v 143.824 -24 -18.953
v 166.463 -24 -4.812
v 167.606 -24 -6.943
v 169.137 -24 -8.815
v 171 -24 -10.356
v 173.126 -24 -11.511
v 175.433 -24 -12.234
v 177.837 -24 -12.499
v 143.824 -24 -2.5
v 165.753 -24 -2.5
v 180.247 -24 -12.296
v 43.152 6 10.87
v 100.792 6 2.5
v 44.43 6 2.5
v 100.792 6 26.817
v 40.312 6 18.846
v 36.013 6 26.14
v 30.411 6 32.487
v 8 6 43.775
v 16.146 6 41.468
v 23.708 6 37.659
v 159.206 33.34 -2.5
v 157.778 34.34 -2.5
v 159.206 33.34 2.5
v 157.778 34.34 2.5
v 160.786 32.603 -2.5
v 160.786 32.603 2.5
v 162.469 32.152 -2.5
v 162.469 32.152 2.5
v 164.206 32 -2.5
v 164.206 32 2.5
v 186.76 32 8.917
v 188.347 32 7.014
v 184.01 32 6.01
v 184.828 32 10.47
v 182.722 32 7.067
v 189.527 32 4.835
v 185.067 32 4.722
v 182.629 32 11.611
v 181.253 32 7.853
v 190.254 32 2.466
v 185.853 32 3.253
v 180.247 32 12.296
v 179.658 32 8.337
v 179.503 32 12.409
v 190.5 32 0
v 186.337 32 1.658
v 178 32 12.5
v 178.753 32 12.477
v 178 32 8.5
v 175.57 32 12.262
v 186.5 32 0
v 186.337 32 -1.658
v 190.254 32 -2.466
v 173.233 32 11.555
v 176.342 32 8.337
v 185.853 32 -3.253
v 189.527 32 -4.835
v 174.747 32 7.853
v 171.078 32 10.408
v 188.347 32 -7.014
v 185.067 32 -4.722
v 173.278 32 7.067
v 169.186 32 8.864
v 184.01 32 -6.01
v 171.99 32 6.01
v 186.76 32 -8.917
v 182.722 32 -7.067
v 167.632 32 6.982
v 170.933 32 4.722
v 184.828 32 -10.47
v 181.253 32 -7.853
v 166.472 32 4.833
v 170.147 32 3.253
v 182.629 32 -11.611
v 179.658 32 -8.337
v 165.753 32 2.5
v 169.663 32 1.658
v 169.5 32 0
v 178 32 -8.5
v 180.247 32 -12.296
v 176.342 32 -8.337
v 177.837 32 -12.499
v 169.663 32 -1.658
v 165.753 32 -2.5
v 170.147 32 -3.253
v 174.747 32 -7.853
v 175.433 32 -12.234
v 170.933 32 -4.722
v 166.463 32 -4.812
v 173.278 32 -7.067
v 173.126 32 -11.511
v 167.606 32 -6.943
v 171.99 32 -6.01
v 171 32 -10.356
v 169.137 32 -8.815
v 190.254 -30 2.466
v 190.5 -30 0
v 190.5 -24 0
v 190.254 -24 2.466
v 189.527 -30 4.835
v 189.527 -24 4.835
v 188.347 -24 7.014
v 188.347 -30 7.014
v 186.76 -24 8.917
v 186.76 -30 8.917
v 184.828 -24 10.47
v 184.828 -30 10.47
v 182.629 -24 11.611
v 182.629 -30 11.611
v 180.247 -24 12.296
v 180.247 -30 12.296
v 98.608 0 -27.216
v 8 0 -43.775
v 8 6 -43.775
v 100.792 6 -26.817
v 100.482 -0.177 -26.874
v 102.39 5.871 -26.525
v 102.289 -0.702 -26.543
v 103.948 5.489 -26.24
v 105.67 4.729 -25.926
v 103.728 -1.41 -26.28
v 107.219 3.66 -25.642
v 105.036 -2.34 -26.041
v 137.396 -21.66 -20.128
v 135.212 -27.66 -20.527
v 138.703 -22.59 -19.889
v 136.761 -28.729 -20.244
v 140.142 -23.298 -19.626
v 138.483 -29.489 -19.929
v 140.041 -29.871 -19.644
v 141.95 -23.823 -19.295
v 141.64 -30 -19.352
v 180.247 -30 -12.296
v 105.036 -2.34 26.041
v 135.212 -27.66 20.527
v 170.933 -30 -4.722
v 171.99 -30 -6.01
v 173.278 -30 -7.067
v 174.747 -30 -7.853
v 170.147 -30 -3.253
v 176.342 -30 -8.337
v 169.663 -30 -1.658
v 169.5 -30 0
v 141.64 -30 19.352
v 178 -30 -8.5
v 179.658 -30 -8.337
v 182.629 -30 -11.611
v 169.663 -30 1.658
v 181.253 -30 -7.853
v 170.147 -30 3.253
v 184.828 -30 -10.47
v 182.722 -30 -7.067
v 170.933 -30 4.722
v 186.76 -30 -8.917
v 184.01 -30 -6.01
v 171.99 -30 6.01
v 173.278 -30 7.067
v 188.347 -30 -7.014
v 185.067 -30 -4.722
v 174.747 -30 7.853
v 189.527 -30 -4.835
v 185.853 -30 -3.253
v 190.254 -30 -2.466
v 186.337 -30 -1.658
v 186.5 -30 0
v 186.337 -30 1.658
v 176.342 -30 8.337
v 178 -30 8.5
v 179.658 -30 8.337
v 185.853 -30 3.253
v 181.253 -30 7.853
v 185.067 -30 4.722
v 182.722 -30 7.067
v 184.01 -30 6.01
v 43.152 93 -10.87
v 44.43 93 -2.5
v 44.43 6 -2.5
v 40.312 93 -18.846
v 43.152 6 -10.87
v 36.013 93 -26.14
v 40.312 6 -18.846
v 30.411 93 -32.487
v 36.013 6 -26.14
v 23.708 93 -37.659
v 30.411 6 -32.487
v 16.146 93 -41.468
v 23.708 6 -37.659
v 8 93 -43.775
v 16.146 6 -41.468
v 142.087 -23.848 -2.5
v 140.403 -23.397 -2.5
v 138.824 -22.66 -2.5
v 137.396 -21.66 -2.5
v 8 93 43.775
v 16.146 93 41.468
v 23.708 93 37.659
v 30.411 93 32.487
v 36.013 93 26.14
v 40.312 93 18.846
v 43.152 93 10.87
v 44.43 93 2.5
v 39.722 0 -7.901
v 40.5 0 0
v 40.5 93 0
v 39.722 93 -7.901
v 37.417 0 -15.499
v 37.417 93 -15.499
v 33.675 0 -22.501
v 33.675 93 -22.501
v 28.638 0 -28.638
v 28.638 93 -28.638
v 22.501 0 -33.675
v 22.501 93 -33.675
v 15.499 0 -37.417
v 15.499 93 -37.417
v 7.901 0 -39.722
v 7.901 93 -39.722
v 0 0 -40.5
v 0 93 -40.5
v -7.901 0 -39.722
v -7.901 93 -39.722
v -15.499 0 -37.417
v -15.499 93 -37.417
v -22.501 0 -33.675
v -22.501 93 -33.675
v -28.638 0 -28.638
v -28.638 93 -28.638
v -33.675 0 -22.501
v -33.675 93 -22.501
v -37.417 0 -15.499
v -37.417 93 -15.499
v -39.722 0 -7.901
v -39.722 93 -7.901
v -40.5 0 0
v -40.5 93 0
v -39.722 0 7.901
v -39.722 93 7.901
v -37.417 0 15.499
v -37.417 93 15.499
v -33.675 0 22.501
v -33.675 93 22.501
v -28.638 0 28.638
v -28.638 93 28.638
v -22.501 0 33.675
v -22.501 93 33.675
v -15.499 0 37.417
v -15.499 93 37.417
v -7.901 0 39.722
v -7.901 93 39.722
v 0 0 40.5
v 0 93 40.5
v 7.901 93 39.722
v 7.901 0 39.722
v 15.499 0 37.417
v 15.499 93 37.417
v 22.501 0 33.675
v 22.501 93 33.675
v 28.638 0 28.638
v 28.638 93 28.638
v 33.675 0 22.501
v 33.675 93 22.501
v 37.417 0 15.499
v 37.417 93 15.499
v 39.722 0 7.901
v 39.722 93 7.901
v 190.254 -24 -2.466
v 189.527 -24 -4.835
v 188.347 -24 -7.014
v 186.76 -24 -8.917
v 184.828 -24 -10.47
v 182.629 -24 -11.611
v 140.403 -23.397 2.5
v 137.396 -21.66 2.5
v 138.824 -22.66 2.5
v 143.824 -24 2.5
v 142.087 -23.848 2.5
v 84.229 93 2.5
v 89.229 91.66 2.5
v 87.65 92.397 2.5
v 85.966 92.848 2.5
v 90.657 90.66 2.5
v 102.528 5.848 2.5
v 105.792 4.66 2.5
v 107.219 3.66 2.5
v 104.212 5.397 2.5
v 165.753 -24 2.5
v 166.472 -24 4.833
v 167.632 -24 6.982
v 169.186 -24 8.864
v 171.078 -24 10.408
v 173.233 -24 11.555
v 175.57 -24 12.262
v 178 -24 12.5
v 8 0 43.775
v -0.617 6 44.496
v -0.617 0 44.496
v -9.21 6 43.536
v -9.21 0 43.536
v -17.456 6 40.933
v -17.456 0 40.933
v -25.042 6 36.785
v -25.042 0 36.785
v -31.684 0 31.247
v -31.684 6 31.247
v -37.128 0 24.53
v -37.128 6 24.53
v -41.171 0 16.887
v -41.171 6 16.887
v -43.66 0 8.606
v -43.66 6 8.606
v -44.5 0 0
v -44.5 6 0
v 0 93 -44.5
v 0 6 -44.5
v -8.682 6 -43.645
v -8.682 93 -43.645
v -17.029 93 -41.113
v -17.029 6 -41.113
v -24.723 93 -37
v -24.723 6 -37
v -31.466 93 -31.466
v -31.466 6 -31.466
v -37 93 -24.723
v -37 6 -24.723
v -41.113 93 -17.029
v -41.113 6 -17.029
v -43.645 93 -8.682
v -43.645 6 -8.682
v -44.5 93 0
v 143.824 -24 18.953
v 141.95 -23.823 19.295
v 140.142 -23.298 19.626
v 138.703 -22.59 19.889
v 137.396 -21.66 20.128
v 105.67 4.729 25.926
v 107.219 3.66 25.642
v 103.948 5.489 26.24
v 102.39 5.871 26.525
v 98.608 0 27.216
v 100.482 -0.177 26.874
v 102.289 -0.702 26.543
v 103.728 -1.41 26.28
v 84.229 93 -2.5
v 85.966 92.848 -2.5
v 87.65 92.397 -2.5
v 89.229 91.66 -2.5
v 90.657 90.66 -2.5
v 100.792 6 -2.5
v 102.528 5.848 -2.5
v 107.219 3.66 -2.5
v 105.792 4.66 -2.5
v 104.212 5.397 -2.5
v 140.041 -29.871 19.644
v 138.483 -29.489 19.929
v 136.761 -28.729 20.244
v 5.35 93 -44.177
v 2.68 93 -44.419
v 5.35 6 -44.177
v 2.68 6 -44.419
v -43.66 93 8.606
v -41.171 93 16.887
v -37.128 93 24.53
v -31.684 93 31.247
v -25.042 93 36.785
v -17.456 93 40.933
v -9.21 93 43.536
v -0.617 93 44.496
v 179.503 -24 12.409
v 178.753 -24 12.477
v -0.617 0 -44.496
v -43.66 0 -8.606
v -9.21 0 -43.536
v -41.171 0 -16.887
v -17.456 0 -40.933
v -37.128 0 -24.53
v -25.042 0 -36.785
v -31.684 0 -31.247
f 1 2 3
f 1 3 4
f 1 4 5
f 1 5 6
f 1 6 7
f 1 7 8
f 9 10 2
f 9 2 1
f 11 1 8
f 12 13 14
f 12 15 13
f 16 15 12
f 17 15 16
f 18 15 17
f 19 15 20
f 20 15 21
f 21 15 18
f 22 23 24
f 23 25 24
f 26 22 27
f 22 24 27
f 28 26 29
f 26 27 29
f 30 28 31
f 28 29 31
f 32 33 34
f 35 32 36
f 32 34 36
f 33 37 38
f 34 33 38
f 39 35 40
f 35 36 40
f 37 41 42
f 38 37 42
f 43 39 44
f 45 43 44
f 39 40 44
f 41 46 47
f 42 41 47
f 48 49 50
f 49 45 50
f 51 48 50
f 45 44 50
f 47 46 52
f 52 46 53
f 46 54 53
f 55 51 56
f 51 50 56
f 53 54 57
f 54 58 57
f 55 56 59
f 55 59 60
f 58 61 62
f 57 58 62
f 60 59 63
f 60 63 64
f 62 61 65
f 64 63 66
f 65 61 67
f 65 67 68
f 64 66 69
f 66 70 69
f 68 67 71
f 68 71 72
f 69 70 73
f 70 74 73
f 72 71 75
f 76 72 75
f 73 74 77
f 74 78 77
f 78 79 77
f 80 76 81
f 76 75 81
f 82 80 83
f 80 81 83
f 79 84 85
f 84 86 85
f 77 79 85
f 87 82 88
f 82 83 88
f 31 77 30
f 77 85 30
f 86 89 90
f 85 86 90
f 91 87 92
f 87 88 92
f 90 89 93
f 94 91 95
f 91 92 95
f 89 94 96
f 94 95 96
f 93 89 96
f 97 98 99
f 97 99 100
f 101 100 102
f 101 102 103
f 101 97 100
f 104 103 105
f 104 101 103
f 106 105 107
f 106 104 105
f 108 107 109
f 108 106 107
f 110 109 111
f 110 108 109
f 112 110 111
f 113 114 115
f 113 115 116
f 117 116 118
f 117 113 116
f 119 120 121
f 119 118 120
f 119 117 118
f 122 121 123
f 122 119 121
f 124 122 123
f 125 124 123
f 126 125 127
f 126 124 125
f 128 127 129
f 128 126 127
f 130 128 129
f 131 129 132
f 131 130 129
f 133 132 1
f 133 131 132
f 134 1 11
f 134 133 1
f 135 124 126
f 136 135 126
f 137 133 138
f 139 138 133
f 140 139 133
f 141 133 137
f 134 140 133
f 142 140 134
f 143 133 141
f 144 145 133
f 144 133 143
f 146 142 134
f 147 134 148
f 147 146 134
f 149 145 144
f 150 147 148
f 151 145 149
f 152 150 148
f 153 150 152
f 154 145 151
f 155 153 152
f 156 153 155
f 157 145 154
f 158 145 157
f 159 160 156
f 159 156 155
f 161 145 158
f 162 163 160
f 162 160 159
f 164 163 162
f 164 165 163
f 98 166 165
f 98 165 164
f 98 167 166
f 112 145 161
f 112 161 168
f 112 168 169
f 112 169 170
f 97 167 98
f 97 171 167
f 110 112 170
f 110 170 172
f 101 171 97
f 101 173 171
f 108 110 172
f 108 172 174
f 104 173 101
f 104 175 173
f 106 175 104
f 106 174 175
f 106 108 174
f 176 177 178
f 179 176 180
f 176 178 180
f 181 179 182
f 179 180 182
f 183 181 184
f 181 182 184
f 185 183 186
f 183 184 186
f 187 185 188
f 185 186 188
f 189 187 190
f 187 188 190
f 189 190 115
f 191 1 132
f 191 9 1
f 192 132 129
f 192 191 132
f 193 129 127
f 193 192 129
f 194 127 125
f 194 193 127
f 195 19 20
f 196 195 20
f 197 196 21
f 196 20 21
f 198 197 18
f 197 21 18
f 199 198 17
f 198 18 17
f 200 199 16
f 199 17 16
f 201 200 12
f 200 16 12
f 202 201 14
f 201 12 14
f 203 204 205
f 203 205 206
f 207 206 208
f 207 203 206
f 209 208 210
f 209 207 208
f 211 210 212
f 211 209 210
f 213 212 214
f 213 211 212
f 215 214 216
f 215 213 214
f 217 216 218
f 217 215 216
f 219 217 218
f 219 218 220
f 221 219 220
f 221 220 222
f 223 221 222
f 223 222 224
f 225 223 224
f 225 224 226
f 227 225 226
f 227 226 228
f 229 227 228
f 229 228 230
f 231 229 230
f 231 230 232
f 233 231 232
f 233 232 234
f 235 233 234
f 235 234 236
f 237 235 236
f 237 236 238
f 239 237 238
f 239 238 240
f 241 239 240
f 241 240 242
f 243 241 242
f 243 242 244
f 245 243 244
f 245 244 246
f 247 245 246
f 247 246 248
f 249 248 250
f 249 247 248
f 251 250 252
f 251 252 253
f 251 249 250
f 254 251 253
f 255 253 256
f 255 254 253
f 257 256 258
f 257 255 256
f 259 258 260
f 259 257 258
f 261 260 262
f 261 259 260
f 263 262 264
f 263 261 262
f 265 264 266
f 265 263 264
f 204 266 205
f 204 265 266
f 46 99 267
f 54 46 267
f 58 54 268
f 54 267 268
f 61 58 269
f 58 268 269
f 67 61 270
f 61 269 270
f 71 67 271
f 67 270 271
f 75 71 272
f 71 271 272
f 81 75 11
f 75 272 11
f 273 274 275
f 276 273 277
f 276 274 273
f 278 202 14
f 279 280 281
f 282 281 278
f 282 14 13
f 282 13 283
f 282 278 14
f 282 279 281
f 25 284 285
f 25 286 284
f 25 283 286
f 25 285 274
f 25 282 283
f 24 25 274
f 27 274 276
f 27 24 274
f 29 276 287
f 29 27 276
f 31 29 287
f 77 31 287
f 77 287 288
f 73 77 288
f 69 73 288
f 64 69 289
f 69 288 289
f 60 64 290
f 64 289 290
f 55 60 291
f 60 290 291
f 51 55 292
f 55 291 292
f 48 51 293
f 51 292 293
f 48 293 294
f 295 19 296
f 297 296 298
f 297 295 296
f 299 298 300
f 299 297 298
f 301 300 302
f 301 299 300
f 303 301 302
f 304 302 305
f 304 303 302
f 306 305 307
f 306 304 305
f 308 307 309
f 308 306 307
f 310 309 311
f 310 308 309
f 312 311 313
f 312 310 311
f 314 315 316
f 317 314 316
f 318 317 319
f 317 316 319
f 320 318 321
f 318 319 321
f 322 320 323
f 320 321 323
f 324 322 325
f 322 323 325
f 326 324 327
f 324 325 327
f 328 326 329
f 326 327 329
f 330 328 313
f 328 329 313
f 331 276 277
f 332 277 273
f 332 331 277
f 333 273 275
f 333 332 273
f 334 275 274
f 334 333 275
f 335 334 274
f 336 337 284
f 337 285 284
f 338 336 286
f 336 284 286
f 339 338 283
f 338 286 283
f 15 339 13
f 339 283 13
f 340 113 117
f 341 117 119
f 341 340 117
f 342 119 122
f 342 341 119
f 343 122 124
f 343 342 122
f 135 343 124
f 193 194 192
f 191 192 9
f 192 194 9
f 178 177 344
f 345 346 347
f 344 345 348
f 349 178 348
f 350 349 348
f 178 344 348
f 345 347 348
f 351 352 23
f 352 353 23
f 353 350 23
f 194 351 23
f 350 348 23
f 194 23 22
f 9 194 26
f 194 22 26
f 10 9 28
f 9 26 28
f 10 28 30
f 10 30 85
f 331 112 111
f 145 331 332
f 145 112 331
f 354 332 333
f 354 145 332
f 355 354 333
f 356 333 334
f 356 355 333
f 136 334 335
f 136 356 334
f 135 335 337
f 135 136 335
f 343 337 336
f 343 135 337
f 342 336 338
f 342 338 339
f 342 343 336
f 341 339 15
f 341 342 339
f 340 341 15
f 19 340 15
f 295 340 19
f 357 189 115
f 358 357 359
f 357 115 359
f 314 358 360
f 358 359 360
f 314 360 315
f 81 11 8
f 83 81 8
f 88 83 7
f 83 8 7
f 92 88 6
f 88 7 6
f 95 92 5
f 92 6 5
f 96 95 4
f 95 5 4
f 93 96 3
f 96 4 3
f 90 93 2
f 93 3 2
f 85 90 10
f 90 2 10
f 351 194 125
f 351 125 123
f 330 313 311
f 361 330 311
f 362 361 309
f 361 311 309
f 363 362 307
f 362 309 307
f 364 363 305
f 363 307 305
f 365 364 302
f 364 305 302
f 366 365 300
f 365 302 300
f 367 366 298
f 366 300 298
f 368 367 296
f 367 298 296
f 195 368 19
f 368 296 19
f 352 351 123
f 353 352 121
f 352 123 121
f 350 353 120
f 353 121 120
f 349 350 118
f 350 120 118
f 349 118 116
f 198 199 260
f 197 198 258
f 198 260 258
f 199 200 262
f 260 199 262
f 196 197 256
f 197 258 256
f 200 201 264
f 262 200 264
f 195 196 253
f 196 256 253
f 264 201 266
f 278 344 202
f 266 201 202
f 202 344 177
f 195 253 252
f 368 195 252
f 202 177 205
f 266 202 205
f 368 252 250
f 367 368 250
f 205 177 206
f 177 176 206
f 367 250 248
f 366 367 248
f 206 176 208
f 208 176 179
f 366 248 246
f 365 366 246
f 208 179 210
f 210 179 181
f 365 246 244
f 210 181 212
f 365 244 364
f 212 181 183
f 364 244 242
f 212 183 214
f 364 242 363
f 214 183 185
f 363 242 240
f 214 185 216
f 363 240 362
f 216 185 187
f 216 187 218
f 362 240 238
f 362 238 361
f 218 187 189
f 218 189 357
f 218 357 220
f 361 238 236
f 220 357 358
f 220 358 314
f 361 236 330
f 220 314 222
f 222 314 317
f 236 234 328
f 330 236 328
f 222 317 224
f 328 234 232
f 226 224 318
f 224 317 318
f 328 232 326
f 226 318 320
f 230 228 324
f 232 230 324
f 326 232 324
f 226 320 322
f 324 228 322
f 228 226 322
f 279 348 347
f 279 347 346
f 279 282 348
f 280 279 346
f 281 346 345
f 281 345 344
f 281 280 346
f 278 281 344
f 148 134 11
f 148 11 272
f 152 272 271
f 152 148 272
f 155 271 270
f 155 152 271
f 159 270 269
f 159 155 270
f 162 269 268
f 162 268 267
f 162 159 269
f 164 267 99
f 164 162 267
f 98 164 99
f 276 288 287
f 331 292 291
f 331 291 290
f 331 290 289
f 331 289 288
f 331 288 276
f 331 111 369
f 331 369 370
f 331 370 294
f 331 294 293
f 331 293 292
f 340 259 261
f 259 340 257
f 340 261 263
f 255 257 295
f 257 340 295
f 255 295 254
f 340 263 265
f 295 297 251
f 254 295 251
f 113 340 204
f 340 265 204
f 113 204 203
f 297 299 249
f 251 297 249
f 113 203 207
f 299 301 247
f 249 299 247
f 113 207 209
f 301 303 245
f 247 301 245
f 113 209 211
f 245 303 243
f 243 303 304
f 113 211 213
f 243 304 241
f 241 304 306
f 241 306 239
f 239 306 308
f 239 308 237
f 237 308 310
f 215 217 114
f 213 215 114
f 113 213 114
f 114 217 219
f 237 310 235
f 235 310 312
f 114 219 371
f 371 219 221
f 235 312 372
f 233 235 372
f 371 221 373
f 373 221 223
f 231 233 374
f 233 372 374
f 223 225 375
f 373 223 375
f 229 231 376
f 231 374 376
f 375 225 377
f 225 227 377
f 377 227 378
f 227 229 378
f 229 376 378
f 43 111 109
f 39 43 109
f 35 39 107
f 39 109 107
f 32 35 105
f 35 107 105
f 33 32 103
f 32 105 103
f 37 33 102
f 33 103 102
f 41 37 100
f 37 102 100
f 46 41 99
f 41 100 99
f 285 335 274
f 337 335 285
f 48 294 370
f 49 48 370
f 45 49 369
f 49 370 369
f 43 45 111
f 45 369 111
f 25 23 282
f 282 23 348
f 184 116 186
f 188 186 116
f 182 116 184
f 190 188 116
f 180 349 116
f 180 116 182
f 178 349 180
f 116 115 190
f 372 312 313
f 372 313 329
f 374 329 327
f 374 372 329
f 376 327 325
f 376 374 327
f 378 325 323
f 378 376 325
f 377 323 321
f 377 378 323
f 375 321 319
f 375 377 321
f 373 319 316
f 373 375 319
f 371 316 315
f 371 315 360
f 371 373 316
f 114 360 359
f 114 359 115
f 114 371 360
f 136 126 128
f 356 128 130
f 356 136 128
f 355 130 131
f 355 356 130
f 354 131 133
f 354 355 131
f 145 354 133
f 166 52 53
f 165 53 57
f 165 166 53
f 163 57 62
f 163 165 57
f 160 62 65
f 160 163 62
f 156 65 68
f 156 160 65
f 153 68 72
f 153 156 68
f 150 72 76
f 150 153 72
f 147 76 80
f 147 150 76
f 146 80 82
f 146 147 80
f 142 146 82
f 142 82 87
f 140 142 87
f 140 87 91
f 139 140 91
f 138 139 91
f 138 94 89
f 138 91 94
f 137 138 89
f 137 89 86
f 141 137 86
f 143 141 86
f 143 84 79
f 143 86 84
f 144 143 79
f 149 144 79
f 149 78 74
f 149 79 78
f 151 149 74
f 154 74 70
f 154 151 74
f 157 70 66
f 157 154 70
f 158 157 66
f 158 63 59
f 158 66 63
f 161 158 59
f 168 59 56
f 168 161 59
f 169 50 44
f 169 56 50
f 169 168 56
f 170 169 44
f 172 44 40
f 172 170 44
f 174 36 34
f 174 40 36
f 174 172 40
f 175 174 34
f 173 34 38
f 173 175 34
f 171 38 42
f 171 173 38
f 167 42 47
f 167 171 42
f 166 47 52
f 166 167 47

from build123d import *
from build123d.topology import SkipClean

# Parameters (mm, degrees)
SKETCH2_R                = 44.5
BOSS_EXTRUDE1_DEPTH      = 93
BOSS_EXTRUDE2_START      = -30
SKETCH2_3_R              = 12.5
BOSS_EXTRUDE2_DEPTH      = 62
EXTRUDE_THIN1_DEPTH      = 115
CUT_EXTRUDE1_START       = -30
CUT_EXTRUDE1_OUTLINE_R   = 8.5
CUT_EXTRUDE1_OUTLINE_R_2 = 40.5
CUT_EXTRUDE1_DEPTH       = 123
RIB1_START               = -2.5
RIB1_DEPTH               = 5
FILLET1_R                = 10


# Read off the part's stored shape, not the designer's step: Cut-Extrude1, Rib1
with BuildPart() as part:
    # Sketch2 → Boss-Extrude1 (new body)
    with BuildSketch(Plane(origin=(0, 0, 0), x_dir=(1, 0, 0), z_dir=(0, 1, 0))):
        with Locations(Location((0, 0, 0), (0, 0, 90))):
            Circle(SKETCH2_R)
    extrude(amount=BOSS_EXTRUDE1_DEPTH)



with BuildPart() as body_2:
    # Sketch2<3> → Boss-Extrude2 (new body)
    with BuildSketch(Plane(origin=(0, 0, 0), x_dir=(1, 0, 0), z_dir=(0, 1, 0)).offset(BOSS_EXTRUDE2_START)):
        with Locations(Location((178, 0, 0), (0, 0, 270))):
            Circle(SKETCH2_3_R)
    extrude(amount=BOSS_EXTRUDE2_DEPTH)


with BuildPart() as part_1:
    add(part.part)

    add(body_2.part)  # Extrude-Thin1 merges body 2
    # Sketch3 → Extrude-Thin1 (add, symmetric)
    with BuildSketch(Plane.XY):
        Polygon((-44.5, 0), (102.247392222, 0), (138, -30), (190.5, -30), (190.5, -24), (140.183821406, -24), (104.431213628, 6), (-44.5, 6), align=None)
    extrude(amount=EXTRUDE_THIN1_DEPTH, both=True)

    # Cut-Extrude1 outline → Cut-Extrude1 (cut)
    with SkipClean():  # the faces are left unmerged after this step: merging them gives an invalid solid
        with BuildSketch(Plane(origin=(0, 0, 0), x_dir=(1, 0, 0), z_dir=(0, 1, 0)).offset(CUT_EXTRUDE1_START)):
            with Locations((178, 0)):
                Circle(CUT_EXTRUDE1_OUTLINE_R)
            with BuildLine():
                ThreePointArc((-44.5, 0), (-28.497806933, 34.1778437), (8, 43.774992861))
                Line((8, 43.774992861), (180.247191011, 12.296346309))
                ThreePointArc((180.247191011, 12.296346309), (187.600517893, 8.005001948), (190.5, 0))
                Line((190.5, 0), (190.5, 115))
                Line((190.5, 115), (-44.5, 115))
                Line((-44.5, 115), (-44.5, 0))
            make_face()
            with BuildLine():
                ThreePointArc((8, -43.774992861), (-28.497806933, -34.1778437), (-44.5, 0))
                Line((-44.5, 0), (-44.5, -115))
                Line((-44.5, -115), (190.5, -115))
                Line((190.5, -115), (190.5, 0))
                ThreePointArc((190.5, 0), (187.600517893, -8.005001948), (180.247191011, -12.296346309))
                Line((180.247191011, -12.296346309), (8, -43.774992861))
            make_face()
            Circle(CUT_EXTRUDE1_OUTLINE_R_2)
        extrude(amount=CUT_EXTRUDE1_DEPTH, mode=Mode.SUBTRACT)

    # Rib1 outline → Rib1 (add)
    with BuildSketch(Plane.XY.offset(RIB1_START)):
        Polygon((160.566154525, 32), (87.869185376, 93), (43, 93), (43, 6), (104.431213628, 6), (140.183821406, -24), (167, -24), (167, 32), align=None)
    extrude(amount=RIB1_DEPTH)

    # Fillet1
    fillet1_edges = [part_1.edges().sort_by_distance(p)[0] for p in [
        (140.183821406, -24, -11.05901849),
        (104.431213628, 6, -14.325962052),
        (160.566154525, 32, 0),
        (87.869185376, 93, 0),
        (102.247392222, 0, 0),
        (104.431213628, 6, 14.325962052),
        (140.183821406, -24, 11.05901849),
        (138, -30, 0),
    ]]
    fillet(fillet1_edges, radius=FILLET1_R)


solid = part_1.part
